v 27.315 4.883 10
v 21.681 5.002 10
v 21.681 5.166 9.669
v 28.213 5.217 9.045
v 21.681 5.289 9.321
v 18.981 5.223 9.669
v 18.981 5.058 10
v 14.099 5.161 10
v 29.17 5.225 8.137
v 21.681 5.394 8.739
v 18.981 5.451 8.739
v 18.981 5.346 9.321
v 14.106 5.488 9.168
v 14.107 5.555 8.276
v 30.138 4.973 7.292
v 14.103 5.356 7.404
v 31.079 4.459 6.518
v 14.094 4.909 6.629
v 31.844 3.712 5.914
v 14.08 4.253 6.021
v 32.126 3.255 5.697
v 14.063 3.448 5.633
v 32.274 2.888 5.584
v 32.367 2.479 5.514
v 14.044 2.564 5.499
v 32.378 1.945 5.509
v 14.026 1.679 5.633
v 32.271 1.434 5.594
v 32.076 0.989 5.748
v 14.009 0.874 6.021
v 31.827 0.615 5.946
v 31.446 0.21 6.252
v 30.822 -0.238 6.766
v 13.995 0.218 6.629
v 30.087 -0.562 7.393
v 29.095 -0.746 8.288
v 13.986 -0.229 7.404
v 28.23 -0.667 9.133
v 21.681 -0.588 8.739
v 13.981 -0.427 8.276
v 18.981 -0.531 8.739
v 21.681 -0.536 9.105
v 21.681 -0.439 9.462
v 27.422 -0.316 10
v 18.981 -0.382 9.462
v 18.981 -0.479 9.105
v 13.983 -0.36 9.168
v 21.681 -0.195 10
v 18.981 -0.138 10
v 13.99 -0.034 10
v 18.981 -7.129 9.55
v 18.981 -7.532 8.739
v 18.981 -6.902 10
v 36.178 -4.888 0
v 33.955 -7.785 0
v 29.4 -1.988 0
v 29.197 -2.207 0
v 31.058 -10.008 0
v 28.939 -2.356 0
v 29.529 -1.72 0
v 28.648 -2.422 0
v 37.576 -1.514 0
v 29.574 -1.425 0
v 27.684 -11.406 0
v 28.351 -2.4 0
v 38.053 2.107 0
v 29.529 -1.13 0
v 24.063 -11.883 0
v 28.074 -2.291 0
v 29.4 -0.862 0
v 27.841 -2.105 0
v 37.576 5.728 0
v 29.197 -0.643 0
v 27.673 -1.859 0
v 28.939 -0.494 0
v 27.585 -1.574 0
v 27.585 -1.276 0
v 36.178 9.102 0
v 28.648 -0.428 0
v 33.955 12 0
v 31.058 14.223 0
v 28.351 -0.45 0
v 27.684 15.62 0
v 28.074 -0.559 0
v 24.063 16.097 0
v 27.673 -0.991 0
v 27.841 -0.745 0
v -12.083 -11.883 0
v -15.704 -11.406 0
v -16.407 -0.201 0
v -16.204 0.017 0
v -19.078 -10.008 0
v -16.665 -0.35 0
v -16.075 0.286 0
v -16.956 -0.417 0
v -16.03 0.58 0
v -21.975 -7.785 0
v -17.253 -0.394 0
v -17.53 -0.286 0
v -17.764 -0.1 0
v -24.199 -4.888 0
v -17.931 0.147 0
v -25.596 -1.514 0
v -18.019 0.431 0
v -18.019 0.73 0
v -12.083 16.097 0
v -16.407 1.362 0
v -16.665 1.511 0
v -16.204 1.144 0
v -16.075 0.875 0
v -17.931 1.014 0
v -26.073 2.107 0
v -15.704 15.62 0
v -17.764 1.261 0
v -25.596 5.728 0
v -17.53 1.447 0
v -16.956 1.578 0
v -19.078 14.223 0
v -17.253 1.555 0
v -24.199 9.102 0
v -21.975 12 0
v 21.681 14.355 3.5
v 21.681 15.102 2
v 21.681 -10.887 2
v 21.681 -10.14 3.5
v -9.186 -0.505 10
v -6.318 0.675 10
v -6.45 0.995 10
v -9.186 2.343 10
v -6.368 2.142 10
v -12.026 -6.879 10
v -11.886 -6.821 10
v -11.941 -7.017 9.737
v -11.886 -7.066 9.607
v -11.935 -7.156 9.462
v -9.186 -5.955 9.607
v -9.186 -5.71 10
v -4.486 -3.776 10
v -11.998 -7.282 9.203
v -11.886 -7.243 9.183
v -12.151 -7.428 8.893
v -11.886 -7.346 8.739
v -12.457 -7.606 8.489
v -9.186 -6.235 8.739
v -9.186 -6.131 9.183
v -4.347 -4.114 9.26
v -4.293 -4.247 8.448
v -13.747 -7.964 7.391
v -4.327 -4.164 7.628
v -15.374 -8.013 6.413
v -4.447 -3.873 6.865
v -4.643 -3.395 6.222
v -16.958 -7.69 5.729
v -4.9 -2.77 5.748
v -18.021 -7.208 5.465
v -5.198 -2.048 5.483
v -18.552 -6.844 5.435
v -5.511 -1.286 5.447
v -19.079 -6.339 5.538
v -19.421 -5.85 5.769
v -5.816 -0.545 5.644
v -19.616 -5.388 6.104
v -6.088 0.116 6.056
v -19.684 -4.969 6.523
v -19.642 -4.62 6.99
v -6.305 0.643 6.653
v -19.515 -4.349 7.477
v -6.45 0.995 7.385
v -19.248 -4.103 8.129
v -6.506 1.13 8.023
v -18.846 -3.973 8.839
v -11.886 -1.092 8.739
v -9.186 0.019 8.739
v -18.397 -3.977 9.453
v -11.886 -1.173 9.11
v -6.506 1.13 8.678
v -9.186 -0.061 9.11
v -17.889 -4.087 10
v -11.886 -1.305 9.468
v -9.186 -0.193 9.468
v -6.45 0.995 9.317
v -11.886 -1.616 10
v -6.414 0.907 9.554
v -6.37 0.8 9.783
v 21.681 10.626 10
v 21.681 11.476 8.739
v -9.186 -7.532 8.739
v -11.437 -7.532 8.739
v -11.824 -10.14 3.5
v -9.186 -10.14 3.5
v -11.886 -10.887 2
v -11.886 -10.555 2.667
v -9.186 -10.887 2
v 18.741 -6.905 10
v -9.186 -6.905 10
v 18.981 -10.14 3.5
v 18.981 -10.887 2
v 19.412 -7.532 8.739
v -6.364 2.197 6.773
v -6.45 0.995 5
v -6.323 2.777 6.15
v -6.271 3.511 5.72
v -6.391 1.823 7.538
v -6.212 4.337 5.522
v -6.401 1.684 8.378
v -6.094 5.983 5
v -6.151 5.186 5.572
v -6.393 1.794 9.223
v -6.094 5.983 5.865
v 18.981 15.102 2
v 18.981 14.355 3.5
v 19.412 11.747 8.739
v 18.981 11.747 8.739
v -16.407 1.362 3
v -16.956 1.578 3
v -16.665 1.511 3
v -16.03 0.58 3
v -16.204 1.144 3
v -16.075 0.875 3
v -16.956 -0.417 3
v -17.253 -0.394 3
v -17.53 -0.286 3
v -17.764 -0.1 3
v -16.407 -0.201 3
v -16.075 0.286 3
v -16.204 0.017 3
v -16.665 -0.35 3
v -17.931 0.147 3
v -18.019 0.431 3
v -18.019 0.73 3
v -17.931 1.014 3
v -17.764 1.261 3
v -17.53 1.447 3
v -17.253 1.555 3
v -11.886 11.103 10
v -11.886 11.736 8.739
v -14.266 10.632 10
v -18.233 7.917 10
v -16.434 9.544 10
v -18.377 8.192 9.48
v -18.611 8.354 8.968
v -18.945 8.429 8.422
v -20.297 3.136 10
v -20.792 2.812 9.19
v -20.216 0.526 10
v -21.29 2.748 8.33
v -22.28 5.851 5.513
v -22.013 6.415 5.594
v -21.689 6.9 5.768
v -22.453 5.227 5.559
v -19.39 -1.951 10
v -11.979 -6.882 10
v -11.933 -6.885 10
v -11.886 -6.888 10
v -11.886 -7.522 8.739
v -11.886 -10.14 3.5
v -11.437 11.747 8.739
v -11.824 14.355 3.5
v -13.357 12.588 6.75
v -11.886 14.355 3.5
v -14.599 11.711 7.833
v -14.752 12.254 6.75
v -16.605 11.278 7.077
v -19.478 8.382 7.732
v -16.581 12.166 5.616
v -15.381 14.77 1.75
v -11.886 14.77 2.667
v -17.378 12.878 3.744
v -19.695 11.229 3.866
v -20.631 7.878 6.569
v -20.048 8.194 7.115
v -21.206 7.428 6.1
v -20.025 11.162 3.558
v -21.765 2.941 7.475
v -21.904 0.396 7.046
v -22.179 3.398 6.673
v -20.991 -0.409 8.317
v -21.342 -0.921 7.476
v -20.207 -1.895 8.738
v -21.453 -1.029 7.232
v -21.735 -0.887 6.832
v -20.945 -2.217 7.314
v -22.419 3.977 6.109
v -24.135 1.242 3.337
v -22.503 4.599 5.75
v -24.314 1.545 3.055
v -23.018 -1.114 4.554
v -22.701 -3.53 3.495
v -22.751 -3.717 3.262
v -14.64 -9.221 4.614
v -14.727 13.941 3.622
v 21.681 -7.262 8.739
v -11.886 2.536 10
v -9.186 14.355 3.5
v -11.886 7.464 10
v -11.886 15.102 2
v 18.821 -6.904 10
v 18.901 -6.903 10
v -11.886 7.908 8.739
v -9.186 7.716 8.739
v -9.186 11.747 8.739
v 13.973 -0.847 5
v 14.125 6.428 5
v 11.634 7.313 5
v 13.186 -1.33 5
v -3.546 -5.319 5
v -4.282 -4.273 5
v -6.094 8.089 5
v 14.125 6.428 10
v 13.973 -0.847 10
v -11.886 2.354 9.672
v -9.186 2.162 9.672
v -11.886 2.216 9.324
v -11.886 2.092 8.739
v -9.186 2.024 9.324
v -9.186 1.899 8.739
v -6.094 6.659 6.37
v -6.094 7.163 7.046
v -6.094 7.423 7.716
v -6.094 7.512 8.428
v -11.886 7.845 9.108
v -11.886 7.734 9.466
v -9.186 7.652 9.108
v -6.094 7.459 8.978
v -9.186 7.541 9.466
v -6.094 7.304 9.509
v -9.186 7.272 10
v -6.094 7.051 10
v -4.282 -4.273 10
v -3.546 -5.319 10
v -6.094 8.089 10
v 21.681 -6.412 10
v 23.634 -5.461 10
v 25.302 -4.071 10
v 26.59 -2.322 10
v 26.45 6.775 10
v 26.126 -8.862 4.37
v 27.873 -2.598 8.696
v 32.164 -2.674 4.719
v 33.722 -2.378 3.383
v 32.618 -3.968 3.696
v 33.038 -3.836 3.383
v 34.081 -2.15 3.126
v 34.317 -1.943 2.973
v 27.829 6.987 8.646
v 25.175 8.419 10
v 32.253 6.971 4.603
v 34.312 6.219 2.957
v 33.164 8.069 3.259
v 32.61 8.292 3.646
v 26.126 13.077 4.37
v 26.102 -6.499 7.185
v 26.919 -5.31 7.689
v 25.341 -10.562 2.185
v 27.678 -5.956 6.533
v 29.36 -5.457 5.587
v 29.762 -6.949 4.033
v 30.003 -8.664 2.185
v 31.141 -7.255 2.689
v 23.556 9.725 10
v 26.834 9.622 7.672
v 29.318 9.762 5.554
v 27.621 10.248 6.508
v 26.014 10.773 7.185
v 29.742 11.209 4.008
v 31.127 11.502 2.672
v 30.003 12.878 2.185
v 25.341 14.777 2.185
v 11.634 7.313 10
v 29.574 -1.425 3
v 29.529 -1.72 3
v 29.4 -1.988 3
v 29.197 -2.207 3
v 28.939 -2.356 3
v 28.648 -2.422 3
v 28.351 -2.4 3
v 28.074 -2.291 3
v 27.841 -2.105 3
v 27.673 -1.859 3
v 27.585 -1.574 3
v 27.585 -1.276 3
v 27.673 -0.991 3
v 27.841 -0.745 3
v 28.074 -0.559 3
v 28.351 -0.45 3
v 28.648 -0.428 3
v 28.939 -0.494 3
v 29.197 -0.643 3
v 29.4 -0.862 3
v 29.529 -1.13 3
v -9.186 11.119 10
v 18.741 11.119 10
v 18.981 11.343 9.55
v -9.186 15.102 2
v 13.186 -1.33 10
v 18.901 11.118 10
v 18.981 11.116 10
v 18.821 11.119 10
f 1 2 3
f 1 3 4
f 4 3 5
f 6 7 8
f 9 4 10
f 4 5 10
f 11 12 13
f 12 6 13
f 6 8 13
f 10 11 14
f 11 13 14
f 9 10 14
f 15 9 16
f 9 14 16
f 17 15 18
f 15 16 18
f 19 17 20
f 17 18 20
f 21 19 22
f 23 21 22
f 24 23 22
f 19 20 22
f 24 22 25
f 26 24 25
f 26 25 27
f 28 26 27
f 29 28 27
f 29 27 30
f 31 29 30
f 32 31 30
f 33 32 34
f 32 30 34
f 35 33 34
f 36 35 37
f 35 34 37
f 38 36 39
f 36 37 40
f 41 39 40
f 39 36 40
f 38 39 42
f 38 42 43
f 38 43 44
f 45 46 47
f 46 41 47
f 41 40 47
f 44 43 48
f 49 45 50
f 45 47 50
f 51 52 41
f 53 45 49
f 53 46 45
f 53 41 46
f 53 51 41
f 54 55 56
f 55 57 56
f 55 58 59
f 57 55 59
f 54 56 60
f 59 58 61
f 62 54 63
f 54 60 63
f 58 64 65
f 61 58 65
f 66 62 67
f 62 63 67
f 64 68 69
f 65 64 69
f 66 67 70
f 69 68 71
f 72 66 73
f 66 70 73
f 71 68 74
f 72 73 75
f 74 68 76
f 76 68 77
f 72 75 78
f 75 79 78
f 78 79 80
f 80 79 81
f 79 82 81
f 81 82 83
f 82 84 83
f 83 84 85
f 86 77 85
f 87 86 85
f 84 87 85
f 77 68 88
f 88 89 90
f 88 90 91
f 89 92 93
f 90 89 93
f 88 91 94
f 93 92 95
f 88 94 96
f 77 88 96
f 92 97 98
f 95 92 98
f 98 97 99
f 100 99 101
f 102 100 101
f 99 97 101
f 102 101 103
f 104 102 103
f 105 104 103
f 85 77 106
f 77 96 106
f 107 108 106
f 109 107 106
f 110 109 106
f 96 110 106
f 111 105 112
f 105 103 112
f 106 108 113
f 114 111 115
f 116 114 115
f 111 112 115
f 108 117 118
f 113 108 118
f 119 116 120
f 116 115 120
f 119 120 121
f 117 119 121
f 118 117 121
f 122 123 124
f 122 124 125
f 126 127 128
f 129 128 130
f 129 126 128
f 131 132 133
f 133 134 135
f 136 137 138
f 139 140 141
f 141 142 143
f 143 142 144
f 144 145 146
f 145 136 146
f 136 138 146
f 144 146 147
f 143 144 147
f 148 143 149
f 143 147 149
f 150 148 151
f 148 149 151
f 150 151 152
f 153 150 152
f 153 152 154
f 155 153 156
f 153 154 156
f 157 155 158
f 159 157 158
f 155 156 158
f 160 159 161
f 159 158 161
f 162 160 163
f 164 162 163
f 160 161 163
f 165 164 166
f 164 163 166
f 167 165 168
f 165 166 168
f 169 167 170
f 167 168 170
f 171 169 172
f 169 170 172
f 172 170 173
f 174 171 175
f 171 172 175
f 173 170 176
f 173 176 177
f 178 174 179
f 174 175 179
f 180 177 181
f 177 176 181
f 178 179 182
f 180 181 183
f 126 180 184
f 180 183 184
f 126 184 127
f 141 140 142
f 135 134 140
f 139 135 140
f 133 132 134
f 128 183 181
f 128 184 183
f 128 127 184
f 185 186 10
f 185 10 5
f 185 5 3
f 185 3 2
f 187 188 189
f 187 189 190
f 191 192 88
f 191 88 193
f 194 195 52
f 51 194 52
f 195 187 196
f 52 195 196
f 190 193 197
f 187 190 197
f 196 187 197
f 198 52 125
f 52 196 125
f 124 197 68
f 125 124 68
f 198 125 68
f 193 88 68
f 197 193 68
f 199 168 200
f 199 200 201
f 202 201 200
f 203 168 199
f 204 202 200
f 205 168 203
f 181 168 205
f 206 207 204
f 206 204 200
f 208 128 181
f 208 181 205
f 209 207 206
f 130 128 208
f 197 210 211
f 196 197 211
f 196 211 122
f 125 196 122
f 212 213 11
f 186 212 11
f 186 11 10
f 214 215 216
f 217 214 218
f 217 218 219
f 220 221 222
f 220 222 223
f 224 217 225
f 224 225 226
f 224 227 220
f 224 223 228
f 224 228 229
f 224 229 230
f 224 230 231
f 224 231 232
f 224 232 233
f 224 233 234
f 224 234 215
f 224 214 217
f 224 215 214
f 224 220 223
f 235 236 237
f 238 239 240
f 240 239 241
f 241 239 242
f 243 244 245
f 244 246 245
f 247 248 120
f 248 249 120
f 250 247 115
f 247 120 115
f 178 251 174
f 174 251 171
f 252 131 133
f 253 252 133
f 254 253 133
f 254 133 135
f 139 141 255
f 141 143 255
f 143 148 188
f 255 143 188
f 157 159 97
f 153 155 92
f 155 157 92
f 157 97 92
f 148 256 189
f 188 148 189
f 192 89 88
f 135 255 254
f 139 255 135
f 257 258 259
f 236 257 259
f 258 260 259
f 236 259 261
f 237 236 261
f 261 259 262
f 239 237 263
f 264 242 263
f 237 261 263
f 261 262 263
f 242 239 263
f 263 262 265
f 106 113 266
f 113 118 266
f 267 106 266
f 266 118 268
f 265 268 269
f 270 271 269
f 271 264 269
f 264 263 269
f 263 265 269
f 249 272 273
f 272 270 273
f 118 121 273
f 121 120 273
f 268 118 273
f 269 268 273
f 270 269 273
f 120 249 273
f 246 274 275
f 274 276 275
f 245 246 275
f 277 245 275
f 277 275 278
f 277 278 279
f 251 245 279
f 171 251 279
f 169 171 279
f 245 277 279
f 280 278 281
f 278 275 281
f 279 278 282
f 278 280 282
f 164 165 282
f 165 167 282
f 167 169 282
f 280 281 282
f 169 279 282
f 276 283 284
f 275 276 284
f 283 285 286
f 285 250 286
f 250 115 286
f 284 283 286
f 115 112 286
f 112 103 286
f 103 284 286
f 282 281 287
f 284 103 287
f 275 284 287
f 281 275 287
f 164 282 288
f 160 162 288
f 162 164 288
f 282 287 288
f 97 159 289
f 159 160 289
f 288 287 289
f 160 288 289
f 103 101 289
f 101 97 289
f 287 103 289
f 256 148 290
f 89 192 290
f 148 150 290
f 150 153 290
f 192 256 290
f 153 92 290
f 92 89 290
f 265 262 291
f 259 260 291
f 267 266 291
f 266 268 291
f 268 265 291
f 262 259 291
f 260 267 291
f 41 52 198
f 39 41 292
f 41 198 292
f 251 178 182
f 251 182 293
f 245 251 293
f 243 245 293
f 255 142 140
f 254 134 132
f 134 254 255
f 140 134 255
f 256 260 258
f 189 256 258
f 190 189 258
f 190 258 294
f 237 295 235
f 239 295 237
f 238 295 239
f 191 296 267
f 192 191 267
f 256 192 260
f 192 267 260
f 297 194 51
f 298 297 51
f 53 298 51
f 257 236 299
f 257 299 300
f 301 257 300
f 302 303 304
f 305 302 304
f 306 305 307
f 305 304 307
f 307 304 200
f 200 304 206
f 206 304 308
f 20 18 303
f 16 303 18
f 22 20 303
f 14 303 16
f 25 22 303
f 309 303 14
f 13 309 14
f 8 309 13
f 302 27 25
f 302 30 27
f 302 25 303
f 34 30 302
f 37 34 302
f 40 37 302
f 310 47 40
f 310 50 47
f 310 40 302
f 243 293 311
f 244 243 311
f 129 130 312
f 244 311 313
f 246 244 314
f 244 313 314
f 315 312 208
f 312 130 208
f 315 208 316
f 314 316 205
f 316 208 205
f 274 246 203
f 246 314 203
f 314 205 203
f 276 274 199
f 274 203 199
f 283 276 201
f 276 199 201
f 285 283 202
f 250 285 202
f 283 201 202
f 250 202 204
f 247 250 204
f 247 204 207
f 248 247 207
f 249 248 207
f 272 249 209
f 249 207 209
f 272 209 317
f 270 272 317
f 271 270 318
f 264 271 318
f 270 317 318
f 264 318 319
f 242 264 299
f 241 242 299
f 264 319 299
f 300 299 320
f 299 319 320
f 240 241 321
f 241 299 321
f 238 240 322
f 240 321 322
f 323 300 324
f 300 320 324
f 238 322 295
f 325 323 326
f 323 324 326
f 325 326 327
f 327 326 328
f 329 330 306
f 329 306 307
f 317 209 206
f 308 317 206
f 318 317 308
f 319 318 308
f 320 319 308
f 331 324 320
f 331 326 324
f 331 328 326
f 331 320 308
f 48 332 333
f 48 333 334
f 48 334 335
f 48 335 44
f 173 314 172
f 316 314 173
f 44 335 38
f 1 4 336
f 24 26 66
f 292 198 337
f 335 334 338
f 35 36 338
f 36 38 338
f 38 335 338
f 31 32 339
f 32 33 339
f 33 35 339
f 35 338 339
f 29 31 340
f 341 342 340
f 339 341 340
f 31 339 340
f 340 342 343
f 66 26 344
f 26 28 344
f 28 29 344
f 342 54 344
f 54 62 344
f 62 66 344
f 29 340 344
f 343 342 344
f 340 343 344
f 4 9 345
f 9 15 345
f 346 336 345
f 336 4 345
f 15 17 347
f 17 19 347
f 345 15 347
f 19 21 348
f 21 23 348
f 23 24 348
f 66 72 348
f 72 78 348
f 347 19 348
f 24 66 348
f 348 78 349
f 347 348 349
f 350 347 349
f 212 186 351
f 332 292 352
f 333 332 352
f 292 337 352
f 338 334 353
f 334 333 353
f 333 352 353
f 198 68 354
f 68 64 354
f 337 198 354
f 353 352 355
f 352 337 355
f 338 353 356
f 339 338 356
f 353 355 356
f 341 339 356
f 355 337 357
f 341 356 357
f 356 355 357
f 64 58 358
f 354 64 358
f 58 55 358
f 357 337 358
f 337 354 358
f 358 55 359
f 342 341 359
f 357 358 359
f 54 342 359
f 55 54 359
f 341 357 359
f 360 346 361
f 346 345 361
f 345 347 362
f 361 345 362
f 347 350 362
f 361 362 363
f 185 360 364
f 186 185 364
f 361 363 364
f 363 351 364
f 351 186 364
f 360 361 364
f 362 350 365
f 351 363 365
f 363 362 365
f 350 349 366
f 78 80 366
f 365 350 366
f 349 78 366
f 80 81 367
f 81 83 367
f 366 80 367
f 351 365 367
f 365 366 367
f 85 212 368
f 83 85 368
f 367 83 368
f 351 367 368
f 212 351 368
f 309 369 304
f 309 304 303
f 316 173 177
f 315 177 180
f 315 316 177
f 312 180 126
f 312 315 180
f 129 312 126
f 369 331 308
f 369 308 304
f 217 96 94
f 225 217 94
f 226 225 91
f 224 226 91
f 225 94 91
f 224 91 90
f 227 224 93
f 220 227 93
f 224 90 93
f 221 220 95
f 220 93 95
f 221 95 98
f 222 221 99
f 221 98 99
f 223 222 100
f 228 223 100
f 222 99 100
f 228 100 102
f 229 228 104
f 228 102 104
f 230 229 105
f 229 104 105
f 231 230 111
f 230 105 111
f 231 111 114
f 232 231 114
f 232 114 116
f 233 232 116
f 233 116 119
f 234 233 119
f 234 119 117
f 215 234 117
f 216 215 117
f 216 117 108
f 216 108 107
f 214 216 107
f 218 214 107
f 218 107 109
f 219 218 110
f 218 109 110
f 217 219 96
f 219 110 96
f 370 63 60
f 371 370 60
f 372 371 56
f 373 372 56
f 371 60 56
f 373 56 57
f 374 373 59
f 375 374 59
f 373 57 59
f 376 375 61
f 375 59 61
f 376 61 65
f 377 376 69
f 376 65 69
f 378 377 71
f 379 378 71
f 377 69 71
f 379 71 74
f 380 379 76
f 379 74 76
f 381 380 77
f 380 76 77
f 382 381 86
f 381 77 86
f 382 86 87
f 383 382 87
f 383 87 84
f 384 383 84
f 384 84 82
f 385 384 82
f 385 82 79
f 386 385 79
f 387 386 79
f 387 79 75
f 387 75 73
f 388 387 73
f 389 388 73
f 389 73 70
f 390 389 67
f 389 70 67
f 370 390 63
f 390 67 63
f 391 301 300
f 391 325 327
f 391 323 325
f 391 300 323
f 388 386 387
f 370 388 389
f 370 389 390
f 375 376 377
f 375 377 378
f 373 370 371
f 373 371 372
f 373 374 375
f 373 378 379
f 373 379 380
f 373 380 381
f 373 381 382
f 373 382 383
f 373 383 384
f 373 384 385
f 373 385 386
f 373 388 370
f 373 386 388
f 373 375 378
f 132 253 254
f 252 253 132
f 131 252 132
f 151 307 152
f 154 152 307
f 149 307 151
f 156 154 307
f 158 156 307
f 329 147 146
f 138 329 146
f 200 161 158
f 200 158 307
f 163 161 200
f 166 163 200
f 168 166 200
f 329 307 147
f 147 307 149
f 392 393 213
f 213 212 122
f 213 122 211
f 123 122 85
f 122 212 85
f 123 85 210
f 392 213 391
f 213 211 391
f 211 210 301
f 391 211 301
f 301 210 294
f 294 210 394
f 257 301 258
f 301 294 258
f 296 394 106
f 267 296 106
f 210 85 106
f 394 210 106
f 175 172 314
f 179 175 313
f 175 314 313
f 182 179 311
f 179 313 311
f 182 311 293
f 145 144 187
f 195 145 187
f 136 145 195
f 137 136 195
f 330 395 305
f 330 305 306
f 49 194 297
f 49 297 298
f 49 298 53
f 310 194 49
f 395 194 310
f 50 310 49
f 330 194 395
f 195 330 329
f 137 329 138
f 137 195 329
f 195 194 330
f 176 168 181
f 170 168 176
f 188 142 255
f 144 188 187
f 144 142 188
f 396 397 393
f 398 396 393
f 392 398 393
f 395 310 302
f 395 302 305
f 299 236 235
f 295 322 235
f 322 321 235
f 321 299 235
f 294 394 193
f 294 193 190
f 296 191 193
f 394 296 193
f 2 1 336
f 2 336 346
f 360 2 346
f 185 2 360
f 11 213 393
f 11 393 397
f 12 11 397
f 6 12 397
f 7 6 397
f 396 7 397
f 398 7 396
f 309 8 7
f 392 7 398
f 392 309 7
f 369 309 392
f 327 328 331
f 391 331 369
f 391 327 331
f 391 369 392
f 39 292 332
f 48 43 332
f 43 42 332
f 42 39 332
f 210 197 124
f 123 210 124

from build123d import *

# Parameters (mm, degrees)
SKETCH008_W     = 2.7
SKETCH008_H     = 1.5
PAD_DEPTH       = 20
POCKET_DEPTH    = 5
SKETCH005_R     = 2.917562
POCKET001_DEPTH = 20.6489723154
SKETCH006_R     = 2.917562
POCKET002_DEPTH = 23.0482544438
SKETCH007_R     = 3
POCKET003_DEPTH = 24.3072127265
SKETCH009_R     = 1
POCKET004_DEPTH = 3


with BuildPart() as pad:
    # Sketch008 → Pad (new body, symmetric)
    with BuildSketch(Plane.XZ):
        with Locations((20.330902, 2.75)):
            Rectangle(SKETCH008_W, SKETCH008_H)
        with Locations((-10.535928, 2.75)):
            Rectangle(SKETCH008_W, SKETCH008_H)
        with Locations((-10.535928, 9.489349)):
            Rectangle(SKETCH008_W, SKETCH008_H)
        with Locations((20.330902, 9.48935)):
            Rectangle(SKETCH008_W, SKETCH008_H)
    extrude(amount=PAD_DEPTH, both=True)


with BuildPart() as pocket004:
    # Sketch002 → Loft section 0
    with BuildSketch(Plane.XY.offset(10)):
        with BuildLine():
            ThreePointArc((-11.343506, 11.1193269091), (-20.3555434545, 2.1072894545), (-11.343506, -6.904748))
            Line((-11.343506, -6.904748), (18.7414073452, -6.904748))
            ThreePointArc((18.7414073452, -6.904748), (27.7534447997, 2.1072894545), (18.7414073452, 11.1193269091))
            Line((-11.343506, 11.1193269091), (18.7414073452, 11.1193269091))
        make_face()
    # Sketch003 → Loft section 1
    with BuildSketch(Plane.XY):
        with BuildLine():
            ThreePointArc((-12.0831570349, 16.0971179095), (-26.0729854896, 2.1072894547), (-12.0831570349, -11.882539))
            Line((-12.0831570349, -11.882539), (24.0627546777, -11.882539))
            ThreePointArc((24.0627546777, -11.882539), (38.0525831324, 2.1072894547), (24.0627546777, 16.0971179095))
            Line((-12.0831570349, 16.0971179095), (24.0627546777, 16.0971179095))
        make_face()
    loft()

    # Sketch001 → Pocket (cut)
    with BuildSketch(Plane.XY.offset(10)):
        Polygon((-6.094202, 5.983397), (-6.094202, 8.088668), (11.634386, 7.313041), (14.1254, 6.42784), (13.97268, -0.847062), (13.185631, -1.329644), (-3.545716, -5.318575), (-4.282123, -4.272569), (-6.45014, 0.995308), align=None)
    extrude(amount=-POCKET_DEPTH, mode=Mode.SUBTRACT)

    # Sketch005 → Pocket001 (cut, through all)
    with BuildSketch(Plane(origin=(-6.4881258553, 0.462977012, 0), x_dir=(0.0711766059, 0.9974637291, 0), z_dir=(0.9974637291, -0.0711766059, 0))):
        with Locations((4.141323, 8.428433)):
            Circle(SKETCH005_R)
    extrude(amount=-POCKET001_DEPTH, mode=Mode.SUBTRACT)

    # Sketch006 → Pocket002 (cut, through all)
    with BuildSketch(Plane(origin=(-5.1655859853, -2.1259187014, 0), x_dir=(-0.3805833694, 0.9247466134, 0), z_dir=(0.9247466134, 0.3805833694, 0))):
        with Locations((0.622215, 8.350686)):
            Circle(SKETCH006_R)
    extrude(amount=-POCKET002_DEPTH, mode=Mode.SUBTRACT)

    # Sketch007 → Pocket003 (cut, through all)
    with BuildSketch(Plane(origin=(13.9842993352, -0.2935685174, 0), x_dir=(-0.0209880985, -0.9997797256, 0), z_dir=(-0.9997797256, 0.0209880985, 0))):
        with Locations((-2.85774, 8.49941)):
            Circle(SKETCH007_R)
    extrude(amount=-POCKET003_DEPTH, mode=Mode.SUBTRACT)

    # Cut002: cut Pad
    add(pad.part, mode=Mode.SUBTRACT)

    # Sketch009 → Pocket004 (cut)
    with BuildSketch(Plane(origin=(0, 0, 0), x_dir=(1, 0, 0), z_dir=(0, 0, -1))):
        with Locations((-17.030491, -0.580481)):
            Circle(SKETCH009_R)
        with Locations((28.573694, 1.424915)):
            Circle(SKETCH009_R)
    extrude(amount=-POCKET004_DEPTH, mode=Mode.SUBTRACT)


solid = pocket004.part
